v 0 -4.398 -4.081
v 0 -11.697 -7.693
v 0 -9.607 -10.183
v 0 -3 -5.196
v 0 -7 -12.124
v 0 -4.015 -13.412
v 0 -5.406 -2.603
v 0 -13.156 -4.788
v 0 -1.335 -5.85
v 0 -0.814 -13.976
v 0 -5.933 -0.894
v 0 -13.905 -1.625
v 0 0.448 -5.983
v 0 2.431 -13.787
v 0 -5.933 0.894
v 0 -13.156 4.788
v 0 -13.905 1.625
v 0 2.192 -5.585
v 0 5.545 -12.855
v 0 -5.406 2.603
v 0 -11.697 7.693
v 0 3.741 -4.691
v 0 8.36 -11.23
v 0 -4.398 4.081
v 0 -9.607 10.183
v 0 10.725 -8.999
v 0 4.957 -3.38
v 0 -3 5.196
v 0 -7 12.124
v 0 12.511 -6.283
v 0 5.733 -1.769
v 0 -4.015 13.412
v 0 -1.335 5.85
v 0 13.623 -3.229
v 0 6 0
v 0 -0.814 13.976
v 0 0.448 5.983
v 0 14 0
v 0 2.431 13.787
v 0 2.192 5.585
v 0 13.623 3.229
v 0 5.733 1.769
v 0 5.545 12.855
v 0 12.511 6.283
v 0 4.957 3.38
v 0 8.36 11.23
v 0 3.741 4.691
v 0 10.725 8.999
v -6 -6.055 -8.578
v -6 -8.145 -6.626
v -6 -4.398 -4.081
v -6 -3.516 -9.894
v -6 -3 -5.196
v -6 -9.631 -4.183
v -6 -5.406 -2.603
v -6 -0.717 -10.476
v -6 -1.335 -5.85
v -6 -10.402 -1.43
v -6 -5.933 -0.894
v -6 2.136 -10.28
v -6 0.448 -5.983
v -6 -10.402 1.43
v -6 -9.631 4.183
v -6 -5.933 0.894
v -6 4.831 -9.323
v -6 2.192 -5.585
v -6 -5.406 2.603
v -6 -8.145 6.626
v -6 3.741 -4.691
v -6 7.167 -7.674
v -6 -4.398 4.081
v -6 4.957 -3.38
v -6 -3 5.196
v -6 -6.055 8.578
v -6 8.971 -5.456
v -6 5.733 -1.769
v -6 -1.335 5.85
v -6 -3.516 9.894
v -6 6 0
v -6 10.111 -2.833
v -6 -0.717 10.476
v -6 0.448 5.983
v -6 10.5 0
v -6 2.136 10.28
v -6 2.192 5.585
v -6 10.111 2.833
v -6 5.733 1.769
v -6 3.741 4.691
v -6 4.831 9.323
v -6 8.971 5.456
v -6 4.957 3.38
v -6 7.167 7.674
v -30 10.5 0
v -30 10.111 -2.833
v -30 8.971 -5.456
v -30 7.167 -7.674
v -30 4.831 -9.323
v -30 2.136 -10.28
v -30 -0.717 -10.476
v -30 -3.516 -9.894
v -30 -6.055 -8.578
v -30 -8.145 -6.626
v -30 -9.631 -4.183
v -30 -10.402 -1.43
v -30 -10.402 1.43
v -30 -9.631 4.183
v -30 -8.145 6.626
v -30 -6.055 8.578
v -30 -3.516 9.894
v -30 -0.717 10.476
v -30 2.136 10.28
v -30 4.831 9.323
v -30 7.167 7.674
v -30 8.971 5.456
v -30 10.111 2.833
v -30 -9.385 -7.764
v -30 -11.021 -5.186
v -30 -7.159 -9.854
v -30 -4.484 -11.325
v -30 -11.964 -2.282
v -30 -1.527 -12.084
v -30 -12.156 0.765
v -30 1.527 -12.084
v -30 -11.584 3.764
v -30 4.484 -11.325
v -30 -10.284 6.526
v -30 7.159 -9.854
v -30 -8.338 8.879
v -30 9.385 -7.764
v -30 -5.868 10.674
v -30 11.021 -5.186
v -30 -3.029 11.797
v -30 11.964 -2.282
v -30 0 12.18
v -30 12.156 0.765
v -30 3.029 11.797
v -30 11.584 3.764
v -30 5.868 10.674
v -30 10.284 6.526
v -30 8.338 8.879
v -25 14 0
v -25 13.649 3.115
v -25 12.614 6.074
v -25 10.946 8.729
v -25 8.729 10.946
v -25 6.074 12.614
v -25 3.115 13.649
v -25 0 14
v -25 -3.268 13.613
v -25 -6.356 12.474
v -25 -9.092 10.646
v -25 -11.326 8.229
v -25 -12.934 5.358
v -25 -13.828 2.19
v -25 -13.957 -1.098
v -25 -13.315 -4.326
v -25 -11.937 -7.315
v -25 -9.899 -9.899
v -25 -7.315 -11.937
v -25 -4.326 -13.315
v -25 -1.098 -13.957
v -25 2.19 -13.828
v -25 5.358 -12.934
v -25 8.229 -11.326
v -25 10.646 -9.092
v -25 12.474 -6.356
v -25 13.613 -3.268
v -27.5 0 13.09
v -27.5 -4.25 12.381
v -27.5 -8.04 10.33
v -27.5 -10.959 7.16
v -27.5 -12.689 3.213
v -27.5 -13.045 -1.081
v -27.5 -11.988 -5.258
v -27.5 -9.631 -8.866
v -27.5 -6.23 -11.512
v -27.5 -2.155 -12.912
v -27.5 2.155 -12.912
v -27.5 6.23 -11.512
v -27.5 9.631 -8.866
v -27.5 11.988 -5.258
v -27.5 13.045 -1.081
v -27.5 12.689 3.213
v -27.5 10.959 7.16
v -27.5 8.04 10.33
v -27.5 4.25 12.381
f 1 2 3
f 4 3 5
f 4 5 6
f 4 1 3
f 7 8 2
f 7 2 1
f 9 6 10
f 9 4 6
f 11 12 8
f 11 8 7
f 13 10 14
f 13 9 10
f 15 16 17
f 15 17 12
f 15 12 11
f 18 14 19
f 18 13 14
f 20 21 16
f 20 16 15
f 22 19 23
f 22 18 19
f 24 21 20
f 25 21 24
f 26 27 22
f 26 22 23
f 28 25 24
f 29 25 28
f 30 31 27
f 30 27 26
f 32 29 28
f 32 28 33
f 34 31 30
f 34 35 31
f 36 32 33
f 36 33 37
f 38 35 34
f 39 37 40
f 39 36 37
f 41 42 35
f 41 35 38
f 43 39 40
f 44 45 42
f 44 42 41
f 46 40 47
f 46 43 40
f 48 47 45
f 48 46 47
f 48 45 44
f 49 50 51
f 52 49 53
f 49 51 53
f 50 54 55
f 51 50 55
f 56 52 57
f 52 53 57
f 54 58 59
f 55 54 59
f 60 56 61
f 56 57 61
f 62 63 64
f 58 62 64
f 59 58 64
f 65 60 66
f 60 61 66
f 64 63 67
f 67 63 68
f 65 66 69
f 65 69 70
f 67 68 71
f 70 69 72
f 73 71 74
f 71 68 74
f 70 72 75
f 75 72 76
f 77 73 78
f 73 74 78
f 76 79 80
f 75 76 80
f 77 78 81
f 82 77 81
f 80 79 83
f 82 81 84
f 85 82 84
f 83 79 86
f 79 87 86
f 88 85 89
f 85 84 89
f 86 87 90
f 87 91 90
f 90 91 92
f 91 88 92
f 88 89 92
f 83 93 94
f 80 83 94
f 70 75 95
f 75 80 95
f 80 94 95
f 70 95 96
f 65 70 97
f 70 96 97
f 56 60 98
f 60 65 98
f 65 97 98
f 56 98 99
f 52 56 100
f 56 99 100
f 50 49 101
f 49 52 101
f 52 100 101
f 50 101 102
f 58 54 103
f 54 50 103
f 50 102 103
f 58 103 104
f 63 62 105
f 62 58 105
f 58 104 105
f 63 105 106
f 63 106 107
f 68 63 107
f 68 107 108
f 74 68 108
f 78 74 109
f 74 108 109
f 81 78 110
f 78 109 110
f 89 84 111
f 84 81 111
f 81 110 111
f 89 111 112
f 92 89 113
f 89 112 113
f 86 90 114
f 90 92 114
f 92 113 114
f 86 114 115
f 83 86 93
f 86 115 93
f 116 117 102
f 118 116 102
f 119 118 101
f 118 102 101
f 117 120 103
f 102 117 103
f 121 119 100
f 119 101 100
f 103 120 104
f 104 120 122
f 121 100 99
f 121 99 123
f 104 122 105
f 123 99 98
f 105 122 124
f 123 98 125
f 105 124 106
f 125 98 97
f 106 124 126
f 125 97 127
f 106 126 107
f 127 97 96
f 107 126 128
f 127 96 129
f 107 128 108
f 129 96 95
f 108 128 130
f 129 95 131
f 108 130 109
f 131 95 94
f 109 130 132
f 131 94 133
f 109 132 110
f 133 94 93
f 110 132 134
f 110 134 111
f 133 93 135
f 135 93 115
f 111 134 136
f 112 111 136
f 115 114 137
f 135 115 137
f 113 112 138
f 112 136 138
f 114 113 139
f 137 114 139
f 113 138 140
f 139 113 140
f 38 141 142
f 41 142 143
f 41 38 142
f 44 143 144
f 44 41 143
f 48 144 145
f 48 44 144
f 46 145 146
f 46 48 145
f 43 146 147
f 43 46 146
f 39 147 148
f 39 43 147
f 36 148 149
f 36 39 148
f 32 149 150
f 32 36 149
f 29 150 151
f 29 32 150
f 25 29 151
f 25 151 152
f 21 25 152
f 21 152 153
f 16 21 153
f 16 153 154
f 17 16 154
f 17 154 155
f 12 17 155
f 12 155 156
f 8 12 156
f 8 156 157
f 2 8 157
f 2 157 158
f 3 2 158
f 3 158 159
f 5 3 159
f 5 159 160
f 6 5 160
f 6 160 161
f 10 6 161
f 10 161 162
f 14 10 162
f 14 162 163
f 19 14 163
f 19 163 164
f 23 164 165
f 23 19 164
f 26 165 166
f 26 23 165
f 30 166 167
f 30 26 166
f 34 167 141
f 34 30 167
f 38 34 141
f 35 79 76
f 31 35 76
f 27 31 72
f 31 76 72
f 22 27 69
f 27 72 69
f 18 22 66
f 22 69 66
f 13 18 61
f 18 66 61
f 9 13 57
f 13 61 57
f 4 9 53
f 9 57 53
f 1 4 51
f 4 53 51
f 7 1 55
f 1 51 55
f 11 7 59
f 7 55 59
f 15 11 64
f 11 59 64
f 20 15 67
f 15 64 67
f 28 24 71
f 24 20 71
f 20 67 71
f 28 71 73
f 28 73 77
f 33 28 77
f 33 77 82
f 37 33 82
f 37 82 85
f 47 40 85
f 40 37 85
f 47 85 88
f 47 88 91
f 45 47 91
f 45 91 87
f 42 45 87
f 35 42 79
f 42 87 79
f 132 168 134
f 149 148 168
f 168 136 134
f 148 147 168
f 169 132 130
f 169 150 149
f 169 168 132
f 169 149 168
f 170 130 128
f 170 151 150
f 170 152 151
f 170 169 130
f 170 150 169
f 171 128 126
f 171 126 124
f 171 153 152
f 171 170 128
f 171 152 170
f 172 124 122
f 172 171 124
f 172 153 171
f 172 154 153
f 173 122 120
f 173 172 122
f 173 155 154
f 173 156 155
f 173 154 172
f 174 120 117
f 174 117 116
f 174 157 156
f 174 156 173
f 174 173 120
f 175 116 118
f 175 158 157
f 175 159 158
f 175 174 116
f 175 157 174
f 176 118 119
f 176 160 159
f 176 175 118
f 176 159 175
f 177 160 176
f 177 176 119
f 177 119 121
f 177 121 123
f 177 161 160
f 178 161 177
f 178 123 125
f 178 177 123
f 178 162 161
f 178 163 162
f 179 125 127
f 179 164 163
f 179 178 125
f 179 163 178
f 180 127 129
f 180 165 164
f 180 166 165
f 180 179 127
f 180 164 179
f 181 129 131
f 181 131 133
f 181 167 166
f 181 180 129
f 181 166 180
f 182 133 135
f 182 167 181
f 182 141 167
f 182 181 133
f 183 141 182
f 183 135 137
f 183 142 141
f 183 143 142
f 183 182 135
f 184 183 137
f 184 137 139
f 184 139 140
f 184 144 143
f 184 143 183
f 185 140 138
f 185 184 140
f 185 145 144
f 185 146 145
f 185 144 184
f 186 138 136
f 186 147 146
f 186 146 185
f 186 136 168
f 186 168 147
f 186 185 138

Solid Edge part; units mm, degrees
sketch "Sketch1" plane through (0, 0, 0) normal (0, 0, 1) x (1, 0, 0)
  line L0 (-6, 10.5) -> (-30, 10.5)
  line L1 (-30, 10.5) -> (-30, 14)
  line L2 (-30, 14) -> (0, 14)
  line L3 (0, 14) -> (0, 6)
  line L4 (0, 6) -> (-6, 6)
  line L5 (-6, 6) -> (-6, 10.5)
revolve "RevolvedProtrusion1" add sketch "Sketch1" angle 360 about axis through (-24.1113, 0, 0) along (1, 0, 0)
sketch "Sketch2" plane through (0, 0, 0) normal (0, -1, 0) x (1, 0, 0)
  line L0 (-30, 12.1801) -> (-25, 14)
  dimension "D1" = 5
revolve "RevolvedCutout1" cut sketch "Sketch2" angle 360 about axis through (-24.1113, 0, 0) along (1, 0, 0) material side at (-27.5171, 0, 13.137)
